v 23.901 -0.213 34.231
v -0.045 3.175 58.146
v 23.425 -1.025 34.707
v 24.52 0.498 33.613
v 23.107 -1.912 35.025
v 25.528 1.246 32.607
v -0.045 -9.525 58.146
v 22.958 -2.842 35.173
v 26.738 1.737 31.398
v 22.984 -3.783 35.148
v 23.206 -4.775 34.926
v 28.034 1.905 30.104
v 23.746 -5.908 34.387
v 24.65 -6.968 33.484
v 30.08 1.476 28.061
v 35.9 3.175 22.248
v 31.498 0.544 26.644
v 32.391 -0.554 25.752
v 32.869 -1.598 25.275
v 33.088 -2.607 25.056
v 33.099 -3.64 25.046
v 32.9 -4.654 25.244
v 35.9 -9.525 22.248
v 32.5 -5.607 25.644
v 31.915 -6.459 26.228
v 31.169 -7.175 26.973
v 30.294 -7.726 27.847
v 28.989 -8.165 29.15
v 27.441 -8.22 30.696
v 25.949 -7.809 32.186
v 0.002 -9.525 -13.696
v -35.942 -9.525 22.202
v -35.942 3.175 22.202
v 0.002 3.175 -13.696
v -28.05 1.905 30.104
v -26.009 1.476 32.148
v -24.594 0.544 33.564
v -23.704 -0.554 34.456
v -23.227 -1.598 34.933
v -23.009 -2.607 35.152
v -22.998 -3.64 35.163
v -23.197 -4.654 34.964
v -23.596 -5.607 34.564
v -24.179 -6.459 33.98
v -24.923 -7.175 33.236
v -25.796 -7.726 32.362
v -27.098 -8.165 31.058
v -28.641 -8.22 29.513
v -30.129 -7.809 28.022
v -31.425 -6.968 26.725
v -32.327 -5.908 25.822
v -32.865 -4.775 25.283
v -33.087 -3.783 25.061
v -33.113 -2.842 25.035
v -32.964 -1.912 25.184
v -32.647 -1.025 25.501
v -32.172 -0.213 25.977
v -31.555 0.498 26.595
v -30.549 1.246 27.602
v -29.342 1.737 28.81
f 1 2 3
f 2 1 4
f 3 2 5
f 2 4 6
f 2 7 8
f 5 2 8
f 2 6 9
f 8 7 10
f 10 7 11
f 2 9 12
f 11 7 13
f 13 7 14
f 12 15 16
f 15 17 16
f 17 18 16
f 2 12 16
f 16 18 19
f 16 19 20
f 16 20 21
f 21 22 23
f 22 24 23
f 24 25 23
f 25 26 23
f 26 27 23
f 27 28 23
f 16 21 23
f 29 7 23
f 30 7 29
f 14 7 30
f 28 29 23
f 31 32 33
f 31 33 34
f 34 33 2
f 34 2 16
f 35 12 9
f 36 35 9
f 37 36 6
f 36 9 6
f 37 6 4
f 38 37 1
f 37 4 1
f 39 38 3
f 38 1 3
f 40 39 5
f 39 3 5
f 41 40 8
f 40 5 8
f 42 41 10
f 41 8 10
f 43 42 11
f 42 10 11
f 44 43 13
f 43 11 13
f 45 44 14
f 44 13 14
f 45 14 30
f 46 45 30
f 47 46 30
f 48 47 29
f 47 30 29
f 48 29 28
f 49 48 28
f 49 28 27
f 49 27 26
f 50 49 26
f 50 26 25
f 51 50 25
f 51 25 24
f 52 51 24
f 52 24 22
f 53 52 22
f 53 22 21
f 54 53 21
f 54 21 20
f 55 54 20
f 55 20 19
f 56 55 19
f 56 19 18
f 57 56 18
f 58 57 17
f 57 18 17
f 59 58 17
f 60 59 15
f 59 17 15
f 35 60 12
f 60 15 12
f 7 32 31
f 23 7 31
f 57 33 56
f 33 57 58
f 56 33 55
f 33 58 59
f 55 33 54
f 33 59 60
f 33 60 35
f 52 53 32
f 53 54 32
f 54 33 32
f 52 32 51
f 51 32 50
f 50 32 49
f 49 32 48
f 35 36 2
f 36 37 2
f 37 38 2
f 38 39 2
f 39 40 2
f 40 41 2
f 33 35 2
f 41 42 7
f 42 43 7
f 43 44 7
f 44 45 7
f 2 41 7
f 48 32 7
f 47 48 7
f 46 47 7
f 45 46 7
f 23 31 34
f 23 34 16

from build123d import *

# Parameters (mm, degrees)
F0_W      = 203.2
F0_H      = 44.45
F1_DEPTH  = 3.175
F3_DEPTH  = 6.35
F5_DEPTH  = 25.4
F6_DEPTH  = 25.4
F8_DEPTH  = 12.7
F9_R      = 5.08
F10_DEPTH = 76.2
F12_DEPTH = 25.4


with BuildPart() as f1:
    # F0 (on Front) → F1 (new body, symmetric)
    with BuildSketch(Plane.XZ):
        with Locations((2.1883048997, 22.225)):
            Rectangle(F0_W, F0_H)
    extrude(amount=F1_DEPTH, both=True)

    # F2 (on face) → F3 (join, symmetric)
    with BuildSketch(Plane.XZ.offset(3.175)):
        Polygon((2.2116978689, -13.6960168671), (38.1093217669, 22.2483929692), (2.1649119306, 58.1460168671), (-33.7327119674, 22.2016070308), align=None)
    extrude(amount=F3_DEPTH, both=True)


with BuildPart() as f1_1:
    # F4: moved
    add(f1.part.moved(Location((-2.20971, 0, 0))))

    # F5 (cut): a face of the model
    f5_faces = [f1_1.faces().sort_by_distance(p)[0] for p in [
        (-62.9576531363, -3.175, 22.225592552),
    ]]
    extrude(f5_faces, amount=-F5_DEPTH, mode=Mode.SUBTRACT)

    # F6 (cut): a face of the model
    f6_faces = [f1_1.faces().sort_by_distance(p)[0] for p in [
        (62.9148429358, -3.175, 22.224407448),
    ]]
    extrude(f6_faces, amount=-F6_DEPTH, mode=Mode.SUBTRACT)

    # F7 (on face) → F8 (join)
    with BuildSketch(Plane.XZ.offset(9.525)):
        Polygon((35.8996117669, 58.1460168671), (-0.0447980694, 58.1460168671), (35.8996117669, 22.2483929692), align=None)
        Polygon((-35.9424219674, 22.2016070308), (-0.0447980694, 58.1460168671), (-35.9424219674, 58.1460168671), align=None)
    extrude(amount=-F8_DEPTH)

    # F9 (on face) → F10 (cut)
    with BuildSketch(Plane.YZ.offset(35.8996117669)):
        with Locations((-3.175, 30.1041658968)):
            Circle(F9_R)
    extrude(amount=-F10_DEPTH, mode=Mode.SUBTRACT)

    # F11 (on face) → F12 (cut)
    with BuildSketch(Plane.XZ.offset(9.525)):
        Polygon((35.8996117669, 58.1460168671), (-0.0447980694, 58.1460168671), (35.8996117669, 22.2483929692), align=None)
        Polygon((-35.9424219674, 58.1460168671), (-35.9424219674, 22.2016070308), (-0.0447980694, 58.1460168671), align=None)
    extrude(amount=-F12_DEPTH, mode=Mode.SUBTRACT)


solid = f1_1.part
